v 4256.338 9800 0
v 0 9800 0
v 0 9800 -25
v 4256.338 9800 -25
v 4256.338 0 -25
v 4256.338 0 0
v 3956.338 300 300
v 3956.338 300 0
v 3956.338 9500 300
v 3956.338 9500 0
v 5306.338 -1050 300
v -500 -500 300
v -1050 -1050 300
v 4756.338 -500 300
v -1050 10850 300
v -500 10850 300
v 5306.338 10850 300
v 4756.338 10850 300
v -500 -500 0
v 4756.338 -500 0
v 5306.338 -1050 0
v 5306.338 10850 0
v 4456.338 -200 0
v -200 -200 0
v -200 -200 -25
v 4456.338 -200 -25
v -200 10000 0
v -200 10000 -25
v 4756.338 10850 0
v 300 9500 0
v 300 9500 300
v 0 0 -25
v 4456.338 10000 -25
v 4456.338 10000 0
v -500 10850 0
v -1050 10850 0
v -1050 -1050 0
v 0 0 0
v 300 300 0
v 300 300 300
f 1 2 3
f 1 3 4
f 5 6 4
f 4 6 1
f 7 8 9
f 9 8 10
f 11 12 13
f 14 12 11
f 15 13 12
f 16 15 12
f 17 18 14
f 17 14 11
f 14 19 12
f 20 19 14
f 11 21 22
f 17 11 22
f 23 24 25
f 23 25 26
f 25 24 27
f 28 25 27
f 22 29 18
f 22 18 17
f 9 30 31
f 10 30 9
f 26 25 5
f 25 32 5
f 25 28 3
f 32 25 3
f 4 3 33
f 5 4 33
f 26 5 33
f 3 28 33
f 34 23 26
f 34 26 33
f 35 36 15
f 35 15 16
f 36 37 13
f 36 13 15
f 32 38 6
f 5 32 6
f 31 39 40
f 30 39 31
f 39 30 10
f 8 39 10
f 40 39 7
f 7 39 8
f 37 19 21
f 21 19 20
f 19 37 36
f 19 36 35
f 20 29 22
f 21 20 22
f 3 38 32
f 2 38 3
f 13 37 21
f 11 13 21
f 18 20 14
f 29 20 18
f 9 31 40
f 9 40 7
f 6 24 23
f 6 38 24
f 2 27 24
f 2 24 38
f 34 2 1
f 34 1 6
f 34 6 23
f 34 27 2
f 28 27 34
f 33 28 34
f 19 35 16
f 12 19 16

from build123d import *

# Parameters (mm, degrees)
F0_W     = 3656.338
F0_H     = 9200
F1_DEPTH = 300
F2_W     = 6356.338
F2_H     = 11900
F2_W_2   = 5256.338
F2_H_2   = 10800
F3_DEPTH = 300
F0_W_2   = 4656.338
F0_H_2   = 10200
F0_W_3   = 4256.338
F0_H_3   = 9800
F4_DEPTH = 25
F5_W     = 5256.338
F5_H     = 300
F6_DEPTH = 550.001


with BuildPart() as f1:
    # F0 (on Top) → F1 (new body)
    with BuildSketch(Plane.XY):
        with Locations((2128.169, 4900)):
            Rectangle(F0_W, F0_H)
    extrude(amount=F1_DEPTH)


with BuildPart() as f3:
    # F2 (on face) → F3 (new body)
    with BuildSketch(Plane.XY):
        with Locations((2128.169, 4900)):
            Rectangle(F2_W, F2_H)
        with Locations((2128.169, 4900)):
            Rectangle(F2_W_2, F2_H_2, mode=Mode.SUBTRACT)
    extrude(amount=F3_DEPTH)

    # F5 (on face) → F6 (cut, through all)
    with BuildSketch(Plane.XZ.offset(-10300)):
        with Locations((2128.169, 150)):
            Rectangle(F5_W, F5_H)
    extrude(amount=-F6_DEPTH, mode=Mode.SUBTRACT)


with BuildPart() as f4:
    # F0 (on Top) → F4 (new body)
    with BuildSketch(Plane.XY):
        with Locations((2128.169, 4900)):
            Rectangle(F0_W_2, F0_H_2)
        with Locations((2128.169, 4900)):
            Rectangle(F0_W_3, F0_H_3, mode=Mode.SUBTRACT)
    extrude(amount=-F4_DEPTH)


solid = Compound([f1.part, f3.part, f4.part])
